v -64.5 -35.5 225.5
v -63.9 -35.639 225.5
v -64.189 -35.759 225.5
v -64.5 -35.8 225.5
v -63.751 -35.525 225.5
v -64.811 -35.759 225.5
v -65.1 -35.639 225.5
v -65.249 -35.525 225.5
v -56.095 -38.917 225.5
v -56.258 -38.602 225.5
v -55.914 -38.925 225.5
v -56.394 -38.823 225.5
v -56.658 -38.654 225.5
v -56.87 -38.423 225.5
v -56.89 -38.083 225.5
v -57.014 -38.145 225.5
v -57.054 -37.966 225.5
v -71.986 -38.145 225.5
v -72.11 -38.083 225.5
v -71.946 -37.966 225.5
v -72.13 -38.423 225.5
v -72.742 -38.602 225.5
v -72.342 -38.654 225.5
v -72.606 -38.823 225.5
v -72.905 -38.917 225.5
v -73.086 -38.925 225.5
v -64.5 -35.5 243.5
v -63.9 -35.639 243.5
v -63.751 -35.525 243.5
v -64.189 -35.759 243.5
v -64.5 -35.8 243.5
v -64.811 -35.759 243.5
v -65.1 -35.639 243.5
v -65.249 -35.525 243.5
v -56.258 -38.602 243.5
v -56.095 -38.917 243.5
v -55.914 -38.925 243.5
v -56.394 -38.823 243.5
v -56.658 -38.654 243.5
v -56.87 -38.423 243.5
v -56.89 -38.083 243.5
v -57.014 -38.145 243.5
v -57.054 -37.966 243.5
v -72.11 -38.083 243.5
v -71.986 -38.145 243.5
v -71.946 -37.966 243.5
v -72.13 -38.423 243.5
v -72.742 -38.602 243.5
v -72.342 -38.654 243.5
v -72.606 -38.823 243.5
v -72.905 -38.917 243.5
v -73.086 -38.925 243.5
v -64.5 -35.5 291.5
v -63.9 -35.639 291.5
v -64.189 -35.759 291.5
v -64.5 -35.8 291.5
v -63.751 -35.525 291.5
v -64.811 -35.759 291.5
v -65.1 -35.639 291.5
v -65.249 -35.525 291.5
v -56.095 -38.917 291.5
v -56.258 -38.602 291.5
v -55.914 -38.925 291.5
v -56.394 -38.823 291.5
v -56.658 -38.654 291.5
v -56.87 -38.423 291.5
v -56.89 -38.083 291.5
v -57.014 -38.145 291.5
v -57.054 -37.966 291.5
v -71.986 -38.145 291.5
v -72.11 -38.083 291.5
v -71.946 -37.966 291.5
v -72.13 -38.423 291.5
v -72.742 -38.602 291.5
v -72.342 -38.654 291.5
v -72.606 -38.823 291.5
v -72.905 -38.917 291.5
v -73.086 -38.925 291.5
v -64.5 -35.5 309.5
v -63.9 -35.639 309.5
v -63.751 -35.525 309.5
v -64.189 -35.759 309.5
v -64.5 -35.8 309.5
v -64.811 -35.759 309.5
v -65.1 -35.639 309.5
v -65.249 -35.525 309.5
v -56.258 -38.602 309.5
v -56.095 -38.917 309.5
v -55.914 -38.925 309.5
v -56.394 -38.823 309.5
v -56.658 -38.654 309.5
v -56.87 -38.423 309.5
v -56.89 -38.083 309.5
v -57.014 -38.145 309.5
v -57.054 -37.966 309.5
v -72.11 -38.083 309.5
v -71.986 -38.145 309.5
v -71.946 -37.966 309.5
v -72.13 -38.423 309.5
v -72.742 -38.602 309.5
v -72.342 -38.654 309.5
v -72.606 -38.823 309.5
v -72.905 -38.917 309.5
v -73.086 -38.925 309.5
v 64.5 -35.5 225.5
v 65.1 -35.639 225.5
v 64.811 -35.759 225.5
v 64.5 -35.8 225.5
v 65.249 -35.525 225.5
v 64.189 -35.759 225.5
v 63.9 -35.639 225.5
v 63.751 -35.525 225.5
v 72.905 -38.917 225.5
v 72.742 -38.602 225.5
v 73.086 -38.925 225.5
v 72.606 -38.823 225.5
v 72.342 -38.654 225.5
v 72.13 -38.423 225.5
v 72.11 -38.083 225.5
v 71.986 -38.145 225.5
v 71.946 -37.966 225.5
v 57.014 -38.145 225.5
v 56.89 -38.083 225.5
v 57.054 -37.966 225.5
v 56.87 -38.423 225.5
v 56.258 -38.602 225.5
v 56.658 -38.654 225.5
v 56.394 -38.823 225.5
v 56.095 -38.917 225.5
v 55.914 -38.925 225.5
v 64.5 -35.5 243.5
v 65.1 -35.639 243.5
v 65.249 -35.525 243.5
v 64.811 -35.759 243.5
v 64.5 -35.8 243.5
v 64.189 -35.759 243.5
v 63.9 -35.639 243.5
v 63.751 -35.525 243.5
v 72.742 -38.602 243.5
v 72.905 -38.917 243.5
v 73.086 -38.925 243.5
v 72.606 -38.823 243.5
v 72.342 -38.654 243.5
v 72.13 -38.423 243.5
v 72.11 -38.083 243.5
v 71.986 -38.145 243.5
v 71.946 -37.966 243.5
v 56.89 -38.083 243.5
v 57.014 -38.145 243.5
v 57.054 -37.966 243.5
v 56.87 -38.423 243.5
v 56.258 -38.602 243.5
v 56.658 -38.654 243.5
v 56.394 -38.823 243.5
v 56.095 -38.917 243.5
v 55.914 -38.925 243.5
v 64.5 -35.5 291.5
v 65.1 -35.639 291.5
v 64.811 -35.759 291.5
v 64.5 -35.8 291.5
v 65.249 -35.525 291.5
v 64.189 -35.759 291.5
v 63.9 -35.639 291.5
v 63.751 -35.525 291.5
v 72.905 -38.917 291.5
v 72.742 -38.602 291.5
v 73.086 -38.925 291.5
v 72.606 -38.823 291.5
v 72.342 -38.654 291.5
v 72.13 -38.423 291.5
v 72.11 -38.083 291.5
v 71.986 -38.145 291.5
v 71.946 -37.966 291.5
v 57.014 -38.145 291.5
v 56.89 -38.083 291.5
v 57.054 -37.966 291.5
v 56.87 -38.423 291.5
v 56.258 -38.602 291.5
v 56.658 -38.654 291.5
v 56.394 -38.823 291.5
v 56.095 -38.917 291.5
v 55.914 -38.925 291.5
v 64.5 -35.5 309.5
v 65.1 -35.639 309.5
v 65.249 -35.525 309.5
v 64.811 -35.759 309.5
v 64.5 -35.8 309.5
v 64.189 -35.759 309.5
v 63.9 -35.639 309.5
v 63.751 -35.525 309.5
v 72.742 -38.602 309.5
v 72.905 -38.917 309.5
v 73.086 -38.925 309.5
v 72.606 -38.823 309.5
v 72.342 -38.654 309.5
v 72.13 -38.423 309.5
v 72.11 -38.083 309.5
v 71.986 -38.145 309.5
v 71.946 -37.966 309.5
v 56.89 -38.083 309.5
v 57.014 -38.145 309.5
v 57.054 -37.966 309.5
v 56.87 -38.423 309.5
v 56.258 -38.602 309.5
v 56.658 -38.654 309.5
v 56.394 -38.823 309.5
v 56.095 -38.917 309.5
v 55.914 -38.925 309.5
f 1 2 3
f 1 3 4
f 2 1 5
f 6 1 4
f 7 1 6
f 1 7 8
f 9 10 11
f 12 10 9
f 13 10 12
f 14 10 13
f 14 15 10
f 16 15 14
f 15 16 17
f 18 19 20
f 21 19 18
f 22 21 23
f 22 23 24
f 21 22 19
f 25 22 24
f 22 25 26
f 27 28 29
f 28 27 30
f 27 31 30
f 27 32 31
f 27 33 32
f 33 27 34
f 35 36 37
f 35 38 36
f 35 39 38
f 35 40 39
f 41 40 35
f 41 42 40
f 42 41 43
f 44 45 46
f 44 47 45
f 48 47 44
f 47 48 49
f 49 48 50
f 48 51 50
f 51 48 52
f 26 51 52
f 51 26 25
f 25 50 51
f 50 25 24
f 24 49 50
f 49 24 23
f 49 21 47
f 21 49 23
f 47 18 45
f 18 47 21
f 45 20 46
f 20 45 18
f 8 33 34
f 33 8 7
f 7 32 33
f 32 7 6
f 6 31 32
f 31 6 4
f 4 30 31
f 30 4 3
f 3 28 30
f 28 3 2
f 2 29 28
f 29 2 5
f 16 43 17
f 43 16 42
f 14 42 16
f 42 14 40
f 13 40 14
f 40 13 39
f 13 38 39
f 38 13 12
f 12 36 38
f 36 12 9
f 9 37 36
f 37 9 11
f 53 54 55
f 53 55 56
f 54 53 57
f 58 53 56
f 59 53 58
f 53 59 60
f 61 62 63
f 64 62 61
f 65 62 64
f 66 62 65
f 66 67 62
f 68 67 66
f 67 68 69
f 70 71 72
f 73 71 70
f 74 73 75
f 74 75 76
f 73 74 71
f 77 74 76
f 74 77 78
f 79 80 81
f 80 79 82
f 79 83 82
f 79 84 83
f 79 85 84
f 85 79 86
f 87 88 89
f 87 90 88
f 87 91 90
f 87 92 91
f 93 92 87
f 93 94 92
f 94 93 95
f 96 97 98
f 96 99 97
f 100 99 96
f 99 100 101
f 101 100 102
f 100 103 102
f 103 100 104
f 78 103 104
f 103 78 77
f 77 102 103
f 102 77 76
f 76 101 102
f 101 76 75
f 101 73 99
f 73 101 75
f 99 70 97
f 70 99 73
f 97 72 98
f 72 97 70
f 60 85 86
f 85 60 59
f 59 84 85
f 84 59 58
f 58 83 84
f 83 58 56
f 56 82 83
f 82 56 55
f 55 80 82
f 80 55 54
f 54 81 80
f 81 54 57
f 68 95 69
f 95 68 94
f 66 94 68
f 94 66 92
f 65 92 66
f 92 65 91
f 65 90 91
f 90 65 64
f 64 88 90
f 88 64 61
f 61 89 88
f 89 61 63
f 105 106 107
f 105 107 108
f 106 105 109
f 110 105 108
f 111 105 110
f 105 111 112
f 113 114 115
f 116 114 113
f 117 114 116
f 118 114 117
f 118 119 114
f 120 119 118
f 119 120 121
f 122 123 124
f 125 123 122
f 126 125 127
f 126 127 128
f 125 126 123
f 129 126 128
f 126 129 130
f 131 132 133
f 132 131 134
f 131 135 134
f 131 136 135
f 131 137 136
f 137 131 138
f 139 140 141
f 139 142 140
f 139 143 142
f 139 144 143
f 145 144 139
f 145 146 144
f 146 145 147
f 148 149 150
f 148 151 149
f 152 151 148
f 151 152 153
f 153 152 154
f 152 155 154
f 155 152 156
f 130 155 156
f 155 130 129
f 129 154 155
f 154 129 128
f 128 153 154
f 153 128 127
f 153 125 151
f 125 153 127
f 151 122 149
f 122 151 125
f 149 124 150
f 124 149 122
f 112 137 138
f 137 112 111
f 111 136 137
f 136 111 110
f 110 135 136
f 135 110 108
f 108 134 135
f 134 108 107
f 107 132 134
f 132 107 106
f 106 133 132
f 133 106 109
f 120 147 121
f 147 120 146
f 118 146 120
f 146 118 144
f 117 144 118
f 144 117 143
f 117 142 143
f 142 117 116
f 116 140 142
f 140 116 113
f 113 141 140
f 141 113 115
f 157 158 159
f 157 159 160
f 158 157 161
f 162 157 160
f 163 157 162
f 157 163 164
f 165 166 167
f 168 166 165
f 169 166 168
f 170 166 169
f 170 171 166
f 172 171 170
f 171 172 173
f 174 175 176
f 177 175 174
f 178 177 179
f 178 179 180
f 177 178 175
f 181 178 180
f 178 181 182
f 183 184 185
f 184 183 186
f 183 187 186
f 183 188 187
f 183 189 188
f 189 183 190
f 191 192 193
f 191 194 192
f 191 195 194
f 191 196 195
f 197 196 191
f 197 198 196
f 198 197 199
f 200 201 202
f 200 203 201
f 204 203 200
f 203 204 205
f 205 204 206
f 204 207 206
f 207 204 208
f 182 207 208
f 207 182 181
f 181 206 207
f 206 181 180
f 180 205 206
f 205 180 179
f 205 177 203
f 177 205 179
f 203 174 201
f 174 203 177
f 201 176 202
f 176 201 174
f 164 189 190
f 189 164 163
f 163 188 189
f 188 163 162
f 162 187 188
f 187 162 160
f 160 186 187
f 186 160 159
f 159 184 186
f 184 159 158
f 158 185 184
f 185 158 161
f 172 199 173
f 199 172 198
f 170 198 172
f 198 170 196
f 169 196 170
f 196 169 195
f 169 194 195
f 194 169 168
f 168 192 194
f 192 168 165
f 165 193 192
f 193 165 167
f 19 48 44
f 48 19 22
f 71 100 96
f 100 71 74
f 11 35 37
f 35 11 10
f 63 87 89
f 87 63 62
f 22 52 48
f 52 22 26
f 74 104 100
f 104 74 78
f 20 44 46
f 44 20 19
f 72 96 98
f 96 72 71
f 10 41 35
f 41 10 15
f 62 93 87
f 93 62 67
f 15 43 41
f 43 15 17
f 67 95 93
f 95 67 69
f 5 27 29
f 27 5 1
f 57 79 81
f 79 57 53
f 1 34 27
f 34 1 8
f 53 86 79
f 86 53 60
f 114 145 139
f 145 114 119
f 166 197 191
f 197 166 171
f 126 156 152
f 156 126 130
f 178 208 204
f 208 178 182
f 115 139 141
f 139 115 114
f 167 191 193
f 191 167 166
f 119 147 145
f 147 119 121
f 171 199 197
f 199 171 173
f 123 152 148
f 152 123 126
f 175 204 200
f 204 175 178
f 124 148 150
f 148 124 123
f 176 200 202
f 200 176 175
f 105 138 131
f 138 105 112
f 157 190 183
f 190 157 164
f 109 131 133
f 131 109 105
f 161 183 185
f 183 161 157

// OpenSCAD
// CSG probes for the two lid-mounted HaLow antenna stations (antenna_mount.scad,
// enclosure_lid.scad). Every probe intersects REAL built solids: the reprinted lid, the HEAD
// body, the printed posts and grips, the published reference solids and the neighbouring
// assemblies. EMPTY = interference-free; NON-EMPTY = material/contact present. Contact is not
// proof of retention, fit or load capacity. Every probe covers BOTH stations.
//
// Run: openscad --export-format binstl -o /dev/null -D 'check="name"' antenna_checks.scad
// then look for "Current top level object is empty".
include <enclosure_common.scad>
use <antenna_mount.scad>
use <enclosure_body.scad>
use <enclosure_lid.scad>
use <hitch_arm_layer.scad>
use <pushrod.scad>
use <camera_stack.scad>
use <assemblies.scad>                 // ref_hitch_plate, ref_servo_at
use <throttle_77603/assemblies.scad>  // throttle_station

check = "grip_contact";
probe_tube_d = 25;   // grip probes: 25 and 40 bound the design range

module ant_grips(d) { for (s = [-1, 1], i = [0, 1]) antenna_grip_placed(i, s, d); }
module ant_posts() { for (s = [-1, 1]) antenna_post_placed(s); }
module ant_tubes(d) { for (s = [-1, 1]) antenna_ref(s, d); }
// One station's outside hardware: full-length Ø40 envelope, post, grips at both ends of the
// range, bulkhead top.
module ant_station(s) {
    antenna_ref(s, env = true);
    antenna_post_placed(s);
    for (i = [0, 1], d = [25, 40]) antenna_grip_placed(i, s, d);
    antenna_bulkhead_top_ref(s);
}
module ant_envelope() { for (s = [-1, 1]) ant_station(s); }
// Every purchased part under the lid: both N bulkheads + pigtails and the GNSS SMA jack.
module ant_under_parts() {
    for (s = [-1, 1]) { antenna_bulkhead_under_ref(s); antenna_pigtail_ref(s); }
    gnss_jack_under_ref();
}
// GNSS port room on the lid top: a 10 mm ring round the washer up to 6 mm above the nut (no
// printed dam, nut-driver room), the mated antenna-cable plug, and 20 mm above it where the
// cable turns away (ESTIMATE).
function gn_ring_r() = gn_washer_d_mm() / 2 + 10;
module gn_outside_room() {
    translate([gn_xy_mm()[0], gn_xy_mm()[1], ant_lid_top_z() + 0.01]) {
        cylinder(r = gn_ring_r(), h = gn_nut_top_z() - ant_lid_top_z() + 6, $fn = 72);
        cylinder(r = 15, h = gn_top_h_mm() + 20, $fn = 48);
    }
    gnss_plug_ref();
}
// Room round each N bulkhead: the flange ring on the lid top and the rib cut-back under it.
module ant_n_spanner_room() {
    for (s = [-1, 1]) translate([ant_axis_xy(s)[0], ant_axis_xy(s)[1], ant_lid_top_z() + 0.01])
        cylinder(r = ant_top_d_mm() / 2 + 10, h = ant_top_t_mm() + 6, $fn = 72);
    antenna_lid_rib_clear();
}
// Annular slab dz thick at z0 (body), radii r0..r1 round the GNSS axis.
module gn_ring(r0, r1, z0, dz) {
    translate([gn_xy_mm()[0], gn_xy_mm()[1], z0]) difference() {
        cylinder(r = r1, h = dz, $fn = 72);
        translate([0, 0, -1]) cylinder(r = r0, h = dz + 2, $fn = 72);
    }
}
// Steering servos and adapters over the analysed face range, both pushrods at neutral, and
// each rod's servo-end segment carried with its crank pin (as fit_checks.scad sweeps it).
module ant_steering_sweep() {
    for (side = [-1, 1]) {
        rod_between_points(servo_crank_pin(side), lapbar_pin(side), rod_nominal_setting());
        for (face = [servo_face_forward_check_deg:15:servo_face_reverse_deg]) {
            ref_servo_at(side, face);
            translate(servo_crank_pin_at(side, face) - servo_crank_pin(side)) intersection() {
                rod_between_points(servo_crank_pin(side), lapbar_pin(side), rod_nominal_setting());
                translate(servo_crank_pin(side) + [0, 60, 0]) cube([200, 260, 200], center = true);
            }
        }
    }
}
// Ring round each bulkhead top, 10 mm wide and 1 mm higher than the flange: nothing printed
// may stand there (no dam that holds water round the N joint).
module ant_flange_ring() {
    for (s = [-1, 1]) translate([ant_axis_xy(s)[0], ant_axis_xy(s)[1], ant_lid_top_z() + 0.01])
        difference() {
            cylinder(r = ant_top_d_mm() / 2 + 10, h = ant_top_t_mm() + 1, $fn = 72);
            translate([0, 0, -1]) cylinder(r = ant_top_d_mm() / 2 + 0.01, h = ant_top_t_mm() + 3, $fn = 72);
        }
}
// Driver path to each of the 12 lid screws: head + washer, then the shaft, to 400 mm up.
module ant_lid_screw_access() {
    for (p = lid_screw_points) translate([p[0], p[1], ant_lid_top_z() + 0.01]) {
        cylinder(d = 10, h = 6);
        cylinder(d = 6, h = 400);
    }
}

// ---- Grips ----
// Crush ribs land on the tube at both ends of the range (all four grips).
if (check == "grip_contact") intersection() { ant_grips(probe_tube_d); ant_tubes(probe_tube_d); }
// Held off the ribs toward the open band, each tube slides axially through its grips.
else if (check == "grip_insertion_clear") intersection() {
    ant_grips(probe_tube_d);
    translate([0, -ant_insert_shift_mm(), 0]) ant_tubes(probe_tube_d);
}
// Grips (25 and 40) slide on the post rails without touching (sampled 0.05 above the ledges) ...
else if (check == "grip_post_clear")
    intersection() { ant_posts(); translate([0, 0, 0.05]) { ant_grips(25); ant_grips(40); } }
// ... and sit on the ledges (0.05 sample below each grip).
else if (check == "grip_ledge_contact") intersection() {
    ant_posts();
    translate([0, 0, -0.05]) for (s = [-1, 1]) antenna_grip_placed(0, s, probe_tube_d);
}
else if (check == "grip_upper_ledge_contact") intersection() {
    ant_posts();
    translate([0, 0, -0.05]) for (s = [-1, 1]) antenna_grip_placed(1, s, probe_tube_d);
}
// ---- Post lock ----
// Seated posts (sampled 0.05 above the lid top) clear the socket, recess and lid ...
else if (check == "post_socket_clear")
    intersection() { enclosure_lid_closed(); translate([0, 0, 0.05]) ant_posts(); }
// ... the column foot bears on the lid top ...
else if (check == "post_seat_contact")
    intersection() { enclosure_lid_closed(); translate([0, 0, -0.05]) ant_posts(); }
// ... lifting a post 0.5 mm drives its snap tooth into the socket recess's top face ...
else if (check == "post_lock_retains")
    intersection() { enclosure_lid_closed(); translate([0, 0, ant_post_lift_mm()]) ant_posts(); }
// ... and the free leaf, pressed in by tooth + clearance, clears the socket wall and the post
// core (the post goes in and comes out).
else if (check == "post_snap_deflect_clear") intersection() {
    union() { enclosure_lid_closed(); for (s = [-1, 1]) at_station(s) antenna_post_core(); }
    for (s = [-1, 1]) at_station(s) intersection() {
        translate([ant_snap_deflect_mm(), 0, 0]) antenna_post_snap();
        translate([-100, -100, ant_snap_free_z()]) cube([200, 200, 100]);
    }
}
// ---- Port ----
// Seal lands present on the lid top (under the flange/nut) and the inner face (under the
// nut/shoulder): 0.1 samples.
else if (check == "bulkhead_land_contact")
    intersection() { enclosure_lid_closed(); translate([0, 0, -0.1]) for (s = [-1, 1]) antenna_bulkhead_top_ref(s); }
else if (check == "bulkhead_inner_land_contact")
    intersection() { enclosure_lid_closed(); translate([0, 0, 0.1]) for (s = [-1, 1]) antenna_bulkhead_under_ref(s); }
// Jack, nut and D-flat body fit the D-hole and lands (0.05 samples off the lands).
else if (check == "bulkhead_fit") intersection() {
    enclosure_lid_closed();
    union() for (s = [-1, 1]) {
        translate([0, 0, 0.05]) antenna_bulkhead_top_ref(s);
        translate([0, 0, -0.05]) antenna_bulkhead_under_ref(s);
    }
}
// Pigtails clear the lid's ribs and socket bosses ...
else if (check == "pigtail_clear_lid")
    intersection() { enclosure_lid_closed(); for (s = [-1, 1]) antenna_pigtail_ref(s); }
// ... and the nuts, jacks, pigtails and socket bosses clear the body's walls, flange and seal.
else if (check == "port_clear_body")
    intersection() { enclosure_body(); union() { ant_under_parts(); antenna_lid_add(); } }
// Everything under the lid stays inside the envelope agreed with control_77603.
else if (check == "underlid_in_keepout") difference() {
    intersection() { ant_under_parts(); translate([-200, -200, 0]) cube([400, 400, box_top]); }
    antenna_lid_keepout();
}
// Nothing printed stands in a 10 mm ring round either flange.
else if (check == "no_pool_ring")
    intersection() { ant_flange_ring(); union() { ant_posts(); ant_grips(25); ant_grips(40); } }
// The 12 lid screws stay reachable with both antennas, posts and grips fitted.
else if (check == "lid_screw_access") intersection() { ant_lid_screw_access(); ant_envelope(); }
// ---- Antenna envelope clearances (full 1143 mm, Ø40, plus posts and grips) ----
else if (check == "antenna_vs_antenna") intersection() { ant_station(-1); ant_station(1); }
else if (check == "env_vs_body") intersection() { ant_envelope(); enclosure_body(); }
else if (check == "env_vs_arm_layer") intersection() { ant_envelope(); arm_layer_assembly(); }
else if (check == "env_vs_steering") intersection() { ant_envelope(); ant_steering_sweep(); }
else if (check == "env_vs_throttle") intersection() { ant_envelope(); throttle_station(); }
else if (check == "env_vs_tower") intersection() { ant_envelope(); camera_stack_assembly(); }
else if (check == "env_vs_hitch_plate") intersection() { ant_envelope(); ref_hitch_plate(); }
// ---- GNSS port (SMA bulkhead jack near the compute tower) ----
// Jack, D body, hex, heat-shrink, washer and nut fit the land and hole (0.05 samples off the
// lid top and the land) ...
else if (check == "gnss_jack_fit") intersection() {
    enclosure_lid_closed();
    union() { translate([0, 0, 0.05]) gnss_jack_top_ref(); translate([0, 0, -0.05]) gnss_jack_under_ref(); }
}
// ... the body hex, lifted 0.05, bears on the land (the hole is a counterbored land, not open) ...
else if (check == "gnss_hex_bears")
    intersection() { enclosure_lid_closed(); translate([0, 0, 0.05]) gnss_jack_under_ref(); }
// ... and every point of the hex top face outside the hole (r 3.3..3.9) is backed by the land.
else if (check == "gnss_land_backed")
    difference() { gn_ring(3.3, 3.9, gn_land_z0() + 0.001, 0.1); enclosure_lid_closed(); }
// The D flat keys the body: turned 10 degrees in the land, the body meets the hole's flat.
else if (check == "gnss_dflat_keys")
    intersection() { enclosure_lid_closed(); gnss_dbody(gn_land_z0() + 0.2, 2.6, 10); }
// Outside seat: the washer, lowered 0.05, lands on the lid top ...
else if (check == "gnss_seat_contact")
    intersection() { enclosure_lid_closed(); translate([0, 0, -0.05]) gnss_nut_washer_ref(); }
// ... the whole washer annulus outside the hole is backed by the flat top (0.1 slab under it) ...
else if (check == "gnss_seat_backed")
    difference() { gn_ring(3.3, gn_washer_d_mm() / 2, ant_lid_top_z() - 0.1, 0.099); enclosure_lid_closed(); }
// ... and nothing printed (lid, posts, grips) stands in the 10 mm ring round it (no water dam).
else if (check == "gnss_no_pool") intersection() {
    gn_ring(gn_washer_d_mm() / 2, gn_ring_r(), ant_lid_top_z() + 0.01, 8);
    union() { enclosure_lid_closed(); ant_posts(); ant_grips(25); ant_grips(40); }
}
// The mated antenna-cable plug clears the panel nut, washer and lid (thread left for its nut).
else if (check == "gnss_plug_clear")
    intersection() { gnss_plug_ref(); union() { enclosure_lid_closed(); gnss_nut_washer_ref(); } }
// Under the lid the jack envelope (hex, heat-shrink, spanner room) clears the lid's ribs and
// skirt (sampled 0.01 under the lid's inner face) and the body's walls and flange.
else if (check == "gnss_underlid_clear")
    intersection() {
        translate([0, 0, -0.01]) gnss_lid_keepout();
        union() { enclosure_lid_closed(); enclosure_body(); }
    }
// The GNSS port, outside and under the lid, clears both N stations: antennas (full length,
// Ø40), posts, grips, bulkheads, pigtails, their under-lid envelopes and spanner rooms.
else if (check == "gnss_clear_stations") intersection() {
    union() { gn_outside_room(); gnss_lid_keepout(); }
    union() {
        ant_envelope();
        for (s = [-1, 1]) { antenna_bulkhead_under_ref(s); antenna_pigtail_ref(s); }
        halow_lid_keepout();
        ant_n_spanner_room();
    }
}
// The 12 lid screws stay reachable round the GNSS port room.
else if (check == "gnss_lid_screw_access") intersection() { ant_lid_screw_access(); gn_outside_room(); }
else assert(false, str("unknown check: ", check));
